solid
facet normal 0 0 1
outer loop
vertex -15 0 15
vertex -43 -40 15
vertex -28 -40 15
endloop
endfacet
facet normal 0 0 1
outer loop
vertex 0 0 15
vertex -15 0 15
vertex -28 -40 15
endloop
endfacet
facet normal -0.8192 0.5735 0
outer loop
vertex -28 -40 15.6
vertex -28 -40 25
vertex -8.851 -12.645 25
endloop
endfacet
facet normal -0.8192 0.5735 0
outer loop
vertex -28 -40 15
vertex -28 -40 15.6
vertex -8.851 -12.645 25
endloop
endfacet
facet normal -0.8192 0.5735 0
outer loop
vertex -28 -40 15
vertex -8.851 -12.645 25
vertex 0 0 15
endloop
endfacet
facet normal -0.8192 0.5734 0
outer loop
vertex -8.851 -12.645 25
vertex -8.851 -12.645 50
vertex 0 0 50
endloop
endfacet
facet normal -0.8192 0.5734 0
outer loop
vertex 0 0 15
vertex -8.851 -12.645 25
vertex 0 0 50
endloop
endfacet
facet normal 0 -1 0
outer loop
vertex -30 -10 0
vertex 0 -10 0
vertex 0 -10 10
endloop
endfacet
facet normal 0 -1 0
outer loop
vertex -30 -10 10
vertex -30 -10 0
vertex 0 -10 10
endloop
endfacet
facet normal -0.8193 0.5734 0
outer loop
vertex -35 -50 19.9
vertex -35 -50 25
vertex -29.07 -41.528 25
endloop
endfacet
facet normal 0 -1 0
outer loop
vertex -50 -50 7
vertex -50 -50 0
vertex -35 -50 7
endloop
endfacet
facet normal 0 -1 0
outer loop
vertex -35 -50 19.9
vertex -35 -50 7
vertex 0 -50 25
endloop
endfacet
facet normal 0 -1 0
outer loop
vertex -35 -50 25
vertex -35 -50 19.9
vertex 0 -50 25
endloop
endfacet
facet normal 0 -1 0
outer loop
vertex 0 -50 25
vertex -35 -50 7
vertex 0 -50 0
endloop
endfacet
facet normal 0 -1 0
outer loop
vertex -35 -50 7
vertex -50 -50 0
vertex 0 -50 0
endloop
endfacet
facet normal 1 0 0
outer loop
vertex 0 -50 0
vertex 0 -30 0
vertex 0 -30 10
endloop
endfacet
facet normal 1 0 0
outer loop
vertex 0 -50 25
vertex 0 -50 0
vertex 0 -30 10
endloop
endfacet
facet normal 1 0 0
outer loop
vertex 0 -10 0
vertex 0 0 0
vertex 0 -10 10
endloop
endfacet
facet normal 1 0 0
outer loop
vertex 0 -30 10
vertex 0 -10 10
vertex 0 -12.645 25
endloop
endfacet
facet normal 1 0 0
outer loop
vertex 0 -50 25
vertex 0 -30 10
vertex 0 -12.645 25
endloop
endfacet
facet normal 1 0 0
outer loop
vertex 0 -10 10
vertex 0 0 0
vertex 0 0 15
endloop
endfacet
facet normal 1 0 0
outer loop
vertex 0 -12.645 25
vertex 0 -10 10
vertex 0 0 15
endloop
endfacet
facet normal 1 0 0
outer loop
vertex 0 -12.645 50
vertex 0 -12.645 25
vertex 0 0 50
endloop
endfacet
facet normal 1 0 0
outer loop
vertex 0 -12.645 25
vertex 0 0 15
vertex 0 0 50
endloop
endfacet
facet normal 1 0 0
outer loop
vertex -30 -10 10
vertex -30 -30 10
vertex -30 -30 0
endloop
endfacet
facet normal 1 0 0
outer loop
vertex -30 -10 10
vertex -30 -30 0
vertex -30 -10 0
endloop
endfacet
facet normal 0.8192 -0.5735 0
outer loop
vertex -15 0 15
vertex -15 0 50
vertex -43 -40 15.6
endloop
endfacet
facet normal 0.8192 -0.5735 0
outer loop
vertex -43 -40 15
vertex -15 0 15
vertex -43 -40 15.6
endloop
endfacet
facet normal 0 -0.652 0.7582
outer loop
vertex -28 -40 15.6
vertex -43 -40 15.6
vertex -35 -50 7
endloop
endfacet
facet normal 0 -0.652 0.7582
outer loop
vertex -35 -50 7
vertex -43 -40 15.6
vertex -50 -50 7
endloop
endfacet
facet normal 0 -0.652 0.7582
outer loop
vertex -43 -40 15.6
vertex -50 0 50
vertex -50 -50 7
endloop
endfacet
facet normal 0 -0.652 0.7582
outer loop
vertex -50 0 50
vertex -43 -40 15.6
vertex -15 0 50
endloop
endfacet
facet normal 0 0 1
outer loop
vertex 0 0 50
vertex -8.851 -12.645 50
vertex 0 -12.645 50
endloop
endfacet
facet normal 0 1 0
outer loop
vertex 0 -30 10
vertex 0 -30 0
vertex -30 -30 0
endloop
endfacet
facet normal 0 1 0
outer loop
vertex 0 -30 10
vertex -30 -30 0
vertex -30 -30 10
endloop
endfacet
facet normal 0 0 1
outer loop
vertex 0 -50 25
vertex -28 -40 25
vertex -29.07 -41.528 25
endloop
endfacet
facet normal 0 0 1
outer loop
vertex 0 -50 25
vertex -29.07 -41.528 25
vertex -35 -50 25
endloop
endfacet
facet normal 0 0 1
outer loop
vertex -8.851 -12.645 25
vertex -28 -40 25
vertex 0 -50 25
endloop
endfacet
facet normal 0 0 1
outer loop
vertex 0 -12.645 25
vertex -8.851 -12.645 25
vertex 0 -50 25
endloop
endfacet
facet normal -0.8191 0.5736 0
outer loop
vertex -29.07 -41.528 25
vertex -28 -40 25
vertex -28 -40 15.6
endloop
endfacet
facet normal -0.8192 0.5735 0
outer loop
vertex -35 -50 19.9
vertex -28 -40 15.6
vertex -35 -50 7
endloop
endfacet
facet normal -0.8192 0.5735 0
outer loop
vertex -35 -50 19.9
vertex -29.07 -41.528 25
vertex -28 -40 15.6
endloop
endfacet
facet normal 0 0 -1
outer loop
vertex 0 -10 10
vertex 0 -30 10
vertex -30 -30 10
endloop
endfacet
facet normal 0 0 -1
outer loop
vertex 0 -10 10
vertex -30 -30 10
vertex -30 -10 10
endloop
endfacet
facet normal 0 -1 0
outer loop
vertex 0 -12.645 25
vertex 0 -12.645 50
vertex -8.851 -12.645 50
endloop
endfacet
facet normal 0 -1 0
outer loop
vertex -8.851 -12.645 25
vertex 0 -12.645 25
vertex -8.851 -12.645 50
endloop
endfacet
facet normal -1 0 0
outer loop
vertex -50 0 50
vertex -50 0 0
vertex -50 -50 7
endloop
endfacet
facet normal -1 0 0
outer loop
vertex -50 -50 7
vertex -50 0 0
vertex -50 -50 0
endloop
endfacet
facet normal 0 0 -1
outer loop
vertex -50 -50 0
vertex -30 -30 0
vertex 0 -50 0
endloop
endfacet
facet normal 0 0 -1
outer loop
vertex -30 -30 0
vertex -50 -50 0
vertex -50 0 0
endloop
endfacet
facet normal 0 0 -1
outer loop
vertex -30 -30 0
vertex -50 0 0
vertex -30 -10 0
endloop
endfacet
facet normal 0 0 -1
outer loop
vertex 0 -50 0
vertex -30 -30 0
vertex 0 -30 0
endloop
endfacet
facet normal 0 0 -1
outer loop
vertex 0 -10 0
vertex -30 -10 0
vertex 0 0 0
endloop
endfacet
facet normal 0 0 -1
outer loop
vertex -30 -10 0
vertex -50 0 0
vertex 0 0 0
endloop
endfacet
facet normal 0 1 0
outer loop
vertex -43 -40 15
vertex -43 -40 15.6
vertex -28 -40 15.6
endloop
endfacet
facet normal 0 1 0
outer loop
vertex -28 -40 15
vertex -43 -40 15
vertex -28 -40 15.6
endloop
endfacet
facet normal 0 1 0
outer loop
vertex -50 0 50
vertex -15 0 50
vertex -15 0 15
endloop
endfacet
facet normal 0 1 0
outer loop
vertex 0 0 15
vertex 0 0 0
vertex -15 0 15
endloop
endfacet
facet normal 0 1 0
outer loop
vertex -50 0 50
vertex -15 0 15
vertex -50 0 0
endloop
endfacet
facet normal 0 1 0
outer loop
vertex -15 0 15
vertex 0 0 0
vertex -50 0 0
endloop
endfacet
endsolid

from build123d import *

# Parameters (mm, degrees)
F0_W      = 50
F0_H      = 50
F1_DEPTH  = 50
F3_DEPTH  = 43
F5_DEPTH  = 25
F8_REACH  = 113.7106781187
F10_DEPTH = 35
F12_REACH = 115.9479483752
F13_W     = 20
F13_H     = 10
F14_DEPTH = 30


with BuildPart() as f1:
    # F0 (on Front) → F1 (new body)
    with BuildSketch(Plane.XZ):
        with Locations((-25, 25)):
            Rectangle(F0_W, F0_H)
    extrude(amount=F1_DEPTH)

    # F2 (on face) → F3 (cut)
    with BuildSketch(Plane.XY.offset(50)):
        Polygon((-35, -50), (0, 0), (-50, 0), (-50, -50), align=None)
    extrude(amount=-F3_DEPTH, mode=Mode.SUBTRACT)

    # F4 (on face) → F5 (cut)
    with BuildSketch(Plane.XY.offset(50)):
        Polygon((0, -12.6445109037), (-8.8511576326, -12.6445109037), (-35, -50), (0, -50), align=None)
    extrude(amount=-F5_DEPTH, mode=Mode.SUBTRACT)

    f8_end = Plane(origin=(0, 0, 50), x_dir=(0, -0.8567360565, -0.515755106), z_dir=(0, 0.515755106, -0.8567360565))
    # F6 (on face) → F8 (join, up to a plane its end follows)
    with BuildSketch(Plane.XY.offset(7)):
        Polygon((-50, 0), (-50, -50), (-35, -50), (0, 0), align=None)
    f8_long = extrude(amount=F8_REACH, mode=Mode.PRIVATE)
    add(split(f8_long, bisect_by=f8_end, keep=Keep.TOP, mode=Mode.PRIVATE))

    # F9 (on face) → F10 (cut)
    with BuildSketch(Plane.XY.offset(50)):
        Polygon((-28, -40), (0, 0), (-15, 0), (-43, -40), align=None)
    extrude(amount=-F10_DEPTH, mode=Mode.SUBTRACT)

    f12_end = Plane(origin=(-33.023255814, -47.1760797342, 23.3), x_dir=(-0.5734623444, -0.8192319205, 0), z_dir=(-0.8192319205, 0.5734623444, 0))
    # F11 (on face) → F12 (cut, up to a plane its end follows)
    with BuildSketch(Plane(origin=(-50, 0, 0), x_dir=(0, -1, 0), z_dir=(-1, 0, 0))):
        Polygon((50, 19.9), (0, 50), (50, 7), align=None)
    f12_long = extrude(amount=-F12_REACH, mode=Mode.PRIVATE)
    add(split(f12_long, bisect_by=f12_end, keep=Keep.TOP, mode=Mode.PRIVATE), mode=Mode.SUBTRACT)

    # F13 (on face) → F14 (cut)
    with BuildSketch(Plane.YZ):
        with Locations((-20, 5)):
            Rectangle(F13_W, F13_H)
    extrude(amount=-F14_DEPTH, mode=Mode.SUBTRACT)


solid = f1.part
